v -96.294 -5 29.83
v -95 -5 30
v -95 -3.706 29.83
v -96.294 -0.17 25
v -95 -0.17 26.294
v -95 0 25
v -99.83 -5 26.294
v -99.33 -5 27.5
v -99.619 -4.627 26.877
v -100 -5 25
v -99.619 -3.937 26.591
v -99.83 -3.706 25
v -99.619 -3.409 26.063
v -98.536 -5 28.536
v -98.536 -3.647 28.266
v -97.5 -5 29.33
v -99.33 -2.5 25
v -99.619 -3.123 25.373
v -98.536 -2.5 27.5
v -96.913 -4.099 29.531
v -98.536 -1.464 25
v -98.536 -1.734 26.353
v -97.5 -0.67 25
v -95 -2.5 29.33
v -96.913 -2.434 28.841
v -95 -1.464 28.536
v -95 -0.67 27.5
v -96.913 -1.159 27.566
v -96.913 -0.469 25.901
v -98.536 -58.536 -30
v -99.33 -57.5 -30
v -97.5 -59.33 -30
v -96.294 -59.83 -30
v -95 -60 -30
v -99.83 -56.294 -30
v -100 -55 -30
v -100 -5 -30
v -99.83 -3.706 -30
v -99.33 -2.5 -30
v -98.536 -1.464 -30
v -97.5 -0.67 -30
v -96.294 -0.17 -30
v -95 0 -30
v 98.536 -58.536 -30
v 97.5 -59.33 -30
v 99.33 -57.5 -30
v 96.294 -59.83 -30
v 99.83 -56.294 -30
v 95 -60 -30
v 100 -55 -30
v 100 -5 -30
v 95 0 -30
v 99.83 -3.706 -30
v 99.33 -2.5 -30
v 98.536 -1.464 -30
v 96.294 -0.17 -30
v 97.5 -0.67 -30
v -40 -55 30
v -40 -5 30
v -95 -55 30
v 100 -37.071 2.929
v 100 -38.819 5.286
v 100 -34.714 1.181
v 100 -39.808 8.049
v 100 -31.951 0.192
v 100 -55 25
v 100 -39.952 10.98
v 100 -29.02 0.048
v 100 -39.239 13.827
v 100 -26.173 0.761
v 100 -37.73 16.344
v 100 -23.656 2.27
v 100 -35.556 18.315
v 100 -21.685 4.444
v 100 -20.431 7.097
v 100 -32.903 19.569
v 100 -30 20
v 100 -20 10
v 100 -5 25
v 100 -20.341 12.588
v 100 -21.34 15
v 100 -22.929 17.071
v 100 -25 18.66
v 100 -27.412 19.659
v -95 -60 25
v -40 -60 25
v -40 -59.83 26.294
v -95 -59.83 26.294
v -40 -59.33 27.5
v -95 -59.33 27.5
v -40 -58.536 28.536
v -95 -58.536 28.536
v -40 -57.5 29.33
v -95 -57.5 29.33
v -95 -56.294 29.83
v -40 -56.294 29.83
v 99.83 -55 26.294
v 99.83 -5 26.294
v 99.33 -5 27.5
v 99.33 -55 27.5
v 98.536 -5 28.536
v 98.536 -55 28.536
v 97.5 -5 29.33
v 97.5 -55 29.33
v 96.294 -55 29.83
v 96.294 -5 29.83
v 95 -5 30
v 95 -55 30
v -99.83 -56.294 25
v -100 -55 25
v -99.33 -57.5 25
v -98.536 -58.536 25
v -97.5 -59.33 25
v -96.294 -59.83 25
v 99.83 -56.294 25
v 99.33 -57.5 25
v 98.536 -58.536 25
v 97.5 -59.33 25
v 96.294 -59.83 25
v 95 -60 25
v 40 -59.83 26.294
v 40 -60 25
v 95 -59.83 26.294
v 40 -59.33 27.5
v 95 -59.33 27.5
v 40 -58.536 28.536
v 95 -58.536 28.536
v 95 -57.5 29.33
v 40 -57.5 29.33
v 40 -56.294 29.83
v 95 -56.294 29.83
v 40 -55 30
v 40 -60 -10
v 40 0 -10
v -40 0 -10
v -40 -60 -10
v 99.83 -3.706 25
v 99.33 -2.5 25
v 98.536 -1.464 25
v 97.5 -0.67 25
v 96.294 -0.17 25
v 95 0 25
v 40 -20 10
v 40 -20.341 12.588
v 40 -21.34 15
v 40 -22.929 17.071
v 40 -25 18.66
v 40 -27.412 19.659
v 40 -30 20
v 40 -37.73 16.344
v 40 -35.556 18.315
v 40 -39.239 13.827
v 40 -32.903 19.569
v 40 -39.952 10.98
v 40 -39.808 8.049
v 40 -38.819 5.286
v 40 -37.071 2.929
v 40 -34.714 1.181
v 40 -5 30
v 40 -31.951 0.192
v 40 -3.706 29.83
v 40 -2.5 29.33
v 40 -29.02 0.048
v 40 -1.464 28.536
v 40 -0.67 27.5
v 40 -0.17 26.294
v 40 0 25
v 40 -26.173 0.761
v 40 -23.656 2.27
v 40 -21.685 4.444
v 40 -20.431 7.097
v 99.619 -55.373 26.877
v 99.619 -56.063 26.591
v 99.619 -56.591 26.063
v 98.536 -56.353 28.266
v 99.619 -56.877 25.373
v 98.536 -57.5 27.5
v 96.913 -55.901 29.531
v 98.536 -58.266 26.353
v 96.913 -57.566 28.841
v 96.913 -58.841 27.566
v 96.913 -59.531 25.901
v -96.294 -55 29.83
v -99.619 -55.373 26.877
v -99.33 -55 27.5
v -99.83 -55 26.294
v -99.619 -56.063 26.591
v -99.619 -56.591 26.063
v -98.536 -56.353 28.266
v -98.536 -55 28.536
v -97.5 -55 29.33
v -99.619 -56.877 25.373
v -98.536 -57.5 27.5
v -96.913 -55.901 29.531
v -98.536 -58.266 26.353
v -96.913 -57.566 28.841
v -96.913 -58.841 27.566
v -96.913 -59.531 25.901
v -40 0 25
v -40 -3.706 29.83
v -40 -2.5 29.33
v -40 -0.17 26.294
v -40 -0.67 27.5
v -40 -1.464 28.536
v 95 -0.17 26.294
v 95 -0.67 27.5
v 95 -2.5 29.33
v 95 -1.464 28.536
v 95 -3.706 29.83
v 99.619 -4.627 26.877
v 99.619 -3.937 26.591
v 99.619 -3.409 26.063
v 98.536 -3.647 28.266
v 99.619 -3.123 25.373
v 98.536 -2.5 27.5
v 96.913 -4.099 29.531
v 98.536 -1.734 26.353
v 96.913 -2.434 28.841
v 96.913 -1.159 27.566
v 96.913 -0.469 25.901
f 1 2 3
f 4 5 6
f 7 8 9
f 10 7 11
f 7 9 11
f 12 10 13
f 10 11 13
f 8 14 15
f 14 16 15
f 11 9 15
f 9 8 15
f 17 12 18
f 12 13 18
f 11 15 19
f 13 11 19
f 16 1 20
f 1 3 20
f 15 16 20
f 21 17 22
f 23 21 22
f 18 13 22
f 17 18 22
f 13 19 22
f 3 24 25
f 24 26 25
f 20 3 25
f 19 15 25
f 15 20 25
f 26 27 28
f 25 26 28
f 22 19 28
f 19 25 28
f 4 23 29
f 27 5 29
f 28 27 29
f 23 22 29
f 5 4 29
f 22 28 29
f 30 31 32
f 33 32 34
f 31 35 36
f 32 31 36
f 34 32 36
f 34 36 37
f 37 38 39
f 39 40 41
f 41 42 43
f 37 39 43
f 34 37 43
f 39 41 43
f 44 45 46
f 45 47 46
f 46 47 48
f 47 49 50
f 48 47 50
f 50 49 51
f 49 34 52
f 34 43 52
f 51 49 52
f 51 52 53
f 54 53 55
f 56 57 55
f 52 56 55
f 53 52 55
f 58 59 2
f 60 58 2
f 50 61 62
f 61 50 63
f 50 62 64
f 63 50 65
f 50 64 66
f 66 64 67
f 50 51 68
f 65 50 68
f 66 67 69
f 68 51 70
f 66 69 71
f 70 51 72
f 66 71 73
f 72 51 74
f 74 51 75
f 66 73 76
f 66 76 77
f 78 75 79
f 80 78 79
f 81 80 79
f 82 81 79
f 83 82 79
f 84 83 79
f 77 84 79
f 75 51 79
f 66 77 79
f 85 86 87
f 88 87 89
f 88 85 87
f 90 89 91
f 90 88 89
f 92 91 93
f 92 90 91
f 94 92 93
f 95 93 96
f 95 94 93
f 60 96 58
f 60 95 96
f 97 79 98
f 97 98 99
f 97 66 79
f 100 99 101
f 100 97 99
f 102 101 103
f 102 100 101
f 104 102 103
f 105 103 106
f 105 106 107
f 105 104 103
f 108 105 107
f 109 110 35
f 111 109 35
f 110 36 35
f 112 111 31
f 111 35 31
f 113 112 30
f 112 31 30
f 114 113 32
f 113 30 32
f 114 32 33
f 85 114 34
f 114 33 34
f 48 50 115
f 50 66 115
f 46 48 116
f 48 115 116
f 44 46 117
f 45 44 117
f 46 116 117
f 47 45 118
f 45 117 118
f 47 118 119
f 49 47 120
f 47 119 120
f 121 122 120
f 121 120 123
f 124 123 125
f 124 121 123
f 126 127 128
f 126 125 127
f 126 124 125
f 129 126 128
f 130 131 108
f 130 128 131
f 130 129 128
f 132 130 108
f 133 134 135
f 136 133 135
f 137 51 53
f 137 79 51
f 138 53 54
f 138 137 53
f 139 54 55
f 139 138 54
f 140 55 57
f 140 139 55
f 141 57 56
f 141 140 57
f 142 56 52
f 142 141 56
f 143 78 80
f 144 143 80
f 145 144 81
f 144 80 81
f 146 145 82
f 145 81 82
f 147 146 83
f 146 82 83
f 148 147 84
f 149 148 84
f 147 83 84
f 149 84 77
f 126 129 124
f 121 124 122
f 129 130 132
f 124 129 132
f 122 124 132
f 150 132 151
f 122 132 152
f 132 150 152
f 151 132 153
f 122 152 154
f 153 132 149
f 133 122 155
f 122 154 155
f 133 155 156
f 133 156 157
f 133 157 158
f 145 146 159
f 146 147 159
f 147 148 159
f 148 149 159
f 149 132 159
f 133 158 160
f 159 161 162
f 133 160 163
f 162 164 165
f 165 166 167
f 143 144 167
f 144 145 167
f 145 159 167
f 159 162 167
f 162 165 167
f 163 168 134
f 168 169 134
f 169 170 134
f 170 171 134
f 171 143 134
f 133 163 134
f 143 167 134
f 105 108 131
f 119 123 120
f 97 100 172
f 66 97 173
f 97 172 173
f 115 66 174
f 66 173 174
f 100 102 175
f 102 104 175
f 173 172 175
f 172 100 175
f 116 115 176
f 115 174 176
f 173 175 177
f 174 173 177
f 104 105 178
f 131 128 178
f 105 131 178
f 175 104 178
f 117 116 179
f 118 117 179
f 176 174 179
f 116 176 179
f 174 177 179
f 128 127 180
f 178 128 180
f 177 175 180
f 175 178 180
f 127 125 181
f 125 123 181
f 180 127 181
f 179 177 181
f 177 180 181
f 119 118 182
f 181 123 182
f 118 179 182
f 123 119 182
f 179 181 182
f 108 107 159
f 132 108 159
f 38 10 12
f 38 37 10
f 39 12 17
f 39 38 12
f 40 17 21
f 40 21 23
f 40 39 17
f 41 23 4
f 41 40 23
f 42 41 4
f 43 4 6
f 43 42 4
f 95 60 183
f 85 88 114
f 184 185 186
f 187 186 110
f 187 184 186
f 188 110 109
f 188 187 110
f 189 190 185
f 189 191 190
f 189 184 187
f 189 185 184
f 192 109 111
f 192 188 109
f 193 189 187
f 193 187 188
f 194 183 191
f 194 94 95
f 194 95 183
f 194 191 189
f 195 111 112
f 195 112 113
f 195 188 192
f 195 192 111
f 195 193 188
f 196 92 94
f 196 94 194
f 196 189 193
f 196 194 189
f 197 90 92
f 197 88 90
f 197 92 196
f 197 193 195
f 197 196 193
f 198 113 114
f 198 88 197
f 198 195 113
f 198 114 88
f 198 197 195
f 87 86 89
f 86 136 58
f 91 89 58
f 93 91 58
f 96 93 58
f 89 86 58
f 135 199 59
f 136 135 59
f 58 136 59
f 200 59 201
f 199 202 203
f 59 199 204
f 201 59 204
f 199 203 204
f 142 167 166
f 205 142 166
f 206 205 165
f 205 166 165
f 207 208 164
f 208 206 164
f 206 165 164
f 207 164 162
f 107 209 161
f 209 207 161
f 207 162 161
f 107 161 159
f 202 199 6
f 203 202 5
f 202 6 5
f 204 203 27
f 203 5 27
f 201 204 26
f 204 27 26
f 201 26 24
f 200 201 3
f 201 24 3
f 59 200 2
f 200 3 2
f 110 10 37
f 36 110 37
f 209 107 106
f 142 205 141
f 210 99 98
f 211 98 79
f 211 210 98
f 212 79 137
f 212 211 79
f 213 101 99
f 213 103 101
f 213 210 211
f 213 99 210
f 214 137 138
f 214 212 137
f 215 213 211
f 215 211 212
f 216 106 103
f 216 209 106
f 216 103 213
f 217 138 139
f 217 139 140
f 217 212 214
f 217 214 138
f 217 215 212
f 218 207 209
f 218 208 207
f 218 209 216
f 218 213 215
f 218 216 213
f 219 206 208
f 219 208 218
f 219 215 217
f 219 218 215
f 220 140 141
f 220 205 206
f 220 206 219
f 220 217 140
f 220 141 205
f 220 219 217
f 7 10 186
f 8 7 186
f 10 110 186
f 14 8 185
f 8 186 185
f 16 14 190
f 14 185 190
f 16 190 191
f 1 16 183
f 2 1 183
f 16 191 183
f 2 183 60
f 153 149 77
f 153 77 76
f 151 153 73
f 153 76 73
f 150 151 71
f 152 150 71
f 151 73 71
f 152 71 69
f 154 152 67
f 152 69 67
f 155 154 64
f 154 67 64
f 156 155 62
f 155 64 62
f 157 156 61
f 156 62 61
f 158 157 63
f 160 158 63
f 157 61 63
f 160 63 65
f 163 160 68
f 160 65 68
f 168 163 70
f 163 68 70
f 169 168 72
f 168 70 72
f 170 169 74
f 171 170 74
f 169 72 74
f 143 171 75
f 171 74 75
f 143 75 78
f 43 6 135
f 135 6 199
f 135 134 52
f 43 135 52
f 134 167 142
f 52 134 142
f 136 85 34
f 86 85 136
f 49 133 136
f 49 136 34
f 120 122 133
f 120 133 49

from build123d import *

# Parameters (mm, degrees)
F1_DEPTH = 60
F3_DEPTH = 60
F4_R     = 5


with BuildPart() as f1:
    # F0 (on Front) → F1 (new body)
    with BuildSketch(Plane.XZ):
        Polygon((-100, -30), (100, -30), (100, 30), (40, 30), (40, -10), (-40, -10), (-40, 30), (-100, 30), align=None)
    extrude(amount=F1_DEPTH)

    # F2 (on face) → F3 (cut)
    with BuildSketch(Plane.YZ.offset(100)):
        with BuildLine():
            ThreePointArc((-20, 10), (-22.928932, 17.071068), (-30, 20))
            ThreePointArc((-30, 20), (-37.071068, 2.928932), (-20, 10))
        make_face()
    extrude(amount=-F3_DEPTH, mode=Mode.SUBTRACT)

    # F4
    f4_edges = [f1.edges().sort_by_distance(p)[0] for p in [
        (70, -60, 30),
        (70, 0, 30),
        (100, -30, 30),
        (-70, -60, 30),
        (-70, 0, 30),
        (-100, -30, 30),
        (100, 0, 0),
        (100, -60, 0),
        (-100, 0, 0),
        (-100, -60, 0),
    ]]
    fillet(f4_edges, radius=F4_R)


solid = f1.part
